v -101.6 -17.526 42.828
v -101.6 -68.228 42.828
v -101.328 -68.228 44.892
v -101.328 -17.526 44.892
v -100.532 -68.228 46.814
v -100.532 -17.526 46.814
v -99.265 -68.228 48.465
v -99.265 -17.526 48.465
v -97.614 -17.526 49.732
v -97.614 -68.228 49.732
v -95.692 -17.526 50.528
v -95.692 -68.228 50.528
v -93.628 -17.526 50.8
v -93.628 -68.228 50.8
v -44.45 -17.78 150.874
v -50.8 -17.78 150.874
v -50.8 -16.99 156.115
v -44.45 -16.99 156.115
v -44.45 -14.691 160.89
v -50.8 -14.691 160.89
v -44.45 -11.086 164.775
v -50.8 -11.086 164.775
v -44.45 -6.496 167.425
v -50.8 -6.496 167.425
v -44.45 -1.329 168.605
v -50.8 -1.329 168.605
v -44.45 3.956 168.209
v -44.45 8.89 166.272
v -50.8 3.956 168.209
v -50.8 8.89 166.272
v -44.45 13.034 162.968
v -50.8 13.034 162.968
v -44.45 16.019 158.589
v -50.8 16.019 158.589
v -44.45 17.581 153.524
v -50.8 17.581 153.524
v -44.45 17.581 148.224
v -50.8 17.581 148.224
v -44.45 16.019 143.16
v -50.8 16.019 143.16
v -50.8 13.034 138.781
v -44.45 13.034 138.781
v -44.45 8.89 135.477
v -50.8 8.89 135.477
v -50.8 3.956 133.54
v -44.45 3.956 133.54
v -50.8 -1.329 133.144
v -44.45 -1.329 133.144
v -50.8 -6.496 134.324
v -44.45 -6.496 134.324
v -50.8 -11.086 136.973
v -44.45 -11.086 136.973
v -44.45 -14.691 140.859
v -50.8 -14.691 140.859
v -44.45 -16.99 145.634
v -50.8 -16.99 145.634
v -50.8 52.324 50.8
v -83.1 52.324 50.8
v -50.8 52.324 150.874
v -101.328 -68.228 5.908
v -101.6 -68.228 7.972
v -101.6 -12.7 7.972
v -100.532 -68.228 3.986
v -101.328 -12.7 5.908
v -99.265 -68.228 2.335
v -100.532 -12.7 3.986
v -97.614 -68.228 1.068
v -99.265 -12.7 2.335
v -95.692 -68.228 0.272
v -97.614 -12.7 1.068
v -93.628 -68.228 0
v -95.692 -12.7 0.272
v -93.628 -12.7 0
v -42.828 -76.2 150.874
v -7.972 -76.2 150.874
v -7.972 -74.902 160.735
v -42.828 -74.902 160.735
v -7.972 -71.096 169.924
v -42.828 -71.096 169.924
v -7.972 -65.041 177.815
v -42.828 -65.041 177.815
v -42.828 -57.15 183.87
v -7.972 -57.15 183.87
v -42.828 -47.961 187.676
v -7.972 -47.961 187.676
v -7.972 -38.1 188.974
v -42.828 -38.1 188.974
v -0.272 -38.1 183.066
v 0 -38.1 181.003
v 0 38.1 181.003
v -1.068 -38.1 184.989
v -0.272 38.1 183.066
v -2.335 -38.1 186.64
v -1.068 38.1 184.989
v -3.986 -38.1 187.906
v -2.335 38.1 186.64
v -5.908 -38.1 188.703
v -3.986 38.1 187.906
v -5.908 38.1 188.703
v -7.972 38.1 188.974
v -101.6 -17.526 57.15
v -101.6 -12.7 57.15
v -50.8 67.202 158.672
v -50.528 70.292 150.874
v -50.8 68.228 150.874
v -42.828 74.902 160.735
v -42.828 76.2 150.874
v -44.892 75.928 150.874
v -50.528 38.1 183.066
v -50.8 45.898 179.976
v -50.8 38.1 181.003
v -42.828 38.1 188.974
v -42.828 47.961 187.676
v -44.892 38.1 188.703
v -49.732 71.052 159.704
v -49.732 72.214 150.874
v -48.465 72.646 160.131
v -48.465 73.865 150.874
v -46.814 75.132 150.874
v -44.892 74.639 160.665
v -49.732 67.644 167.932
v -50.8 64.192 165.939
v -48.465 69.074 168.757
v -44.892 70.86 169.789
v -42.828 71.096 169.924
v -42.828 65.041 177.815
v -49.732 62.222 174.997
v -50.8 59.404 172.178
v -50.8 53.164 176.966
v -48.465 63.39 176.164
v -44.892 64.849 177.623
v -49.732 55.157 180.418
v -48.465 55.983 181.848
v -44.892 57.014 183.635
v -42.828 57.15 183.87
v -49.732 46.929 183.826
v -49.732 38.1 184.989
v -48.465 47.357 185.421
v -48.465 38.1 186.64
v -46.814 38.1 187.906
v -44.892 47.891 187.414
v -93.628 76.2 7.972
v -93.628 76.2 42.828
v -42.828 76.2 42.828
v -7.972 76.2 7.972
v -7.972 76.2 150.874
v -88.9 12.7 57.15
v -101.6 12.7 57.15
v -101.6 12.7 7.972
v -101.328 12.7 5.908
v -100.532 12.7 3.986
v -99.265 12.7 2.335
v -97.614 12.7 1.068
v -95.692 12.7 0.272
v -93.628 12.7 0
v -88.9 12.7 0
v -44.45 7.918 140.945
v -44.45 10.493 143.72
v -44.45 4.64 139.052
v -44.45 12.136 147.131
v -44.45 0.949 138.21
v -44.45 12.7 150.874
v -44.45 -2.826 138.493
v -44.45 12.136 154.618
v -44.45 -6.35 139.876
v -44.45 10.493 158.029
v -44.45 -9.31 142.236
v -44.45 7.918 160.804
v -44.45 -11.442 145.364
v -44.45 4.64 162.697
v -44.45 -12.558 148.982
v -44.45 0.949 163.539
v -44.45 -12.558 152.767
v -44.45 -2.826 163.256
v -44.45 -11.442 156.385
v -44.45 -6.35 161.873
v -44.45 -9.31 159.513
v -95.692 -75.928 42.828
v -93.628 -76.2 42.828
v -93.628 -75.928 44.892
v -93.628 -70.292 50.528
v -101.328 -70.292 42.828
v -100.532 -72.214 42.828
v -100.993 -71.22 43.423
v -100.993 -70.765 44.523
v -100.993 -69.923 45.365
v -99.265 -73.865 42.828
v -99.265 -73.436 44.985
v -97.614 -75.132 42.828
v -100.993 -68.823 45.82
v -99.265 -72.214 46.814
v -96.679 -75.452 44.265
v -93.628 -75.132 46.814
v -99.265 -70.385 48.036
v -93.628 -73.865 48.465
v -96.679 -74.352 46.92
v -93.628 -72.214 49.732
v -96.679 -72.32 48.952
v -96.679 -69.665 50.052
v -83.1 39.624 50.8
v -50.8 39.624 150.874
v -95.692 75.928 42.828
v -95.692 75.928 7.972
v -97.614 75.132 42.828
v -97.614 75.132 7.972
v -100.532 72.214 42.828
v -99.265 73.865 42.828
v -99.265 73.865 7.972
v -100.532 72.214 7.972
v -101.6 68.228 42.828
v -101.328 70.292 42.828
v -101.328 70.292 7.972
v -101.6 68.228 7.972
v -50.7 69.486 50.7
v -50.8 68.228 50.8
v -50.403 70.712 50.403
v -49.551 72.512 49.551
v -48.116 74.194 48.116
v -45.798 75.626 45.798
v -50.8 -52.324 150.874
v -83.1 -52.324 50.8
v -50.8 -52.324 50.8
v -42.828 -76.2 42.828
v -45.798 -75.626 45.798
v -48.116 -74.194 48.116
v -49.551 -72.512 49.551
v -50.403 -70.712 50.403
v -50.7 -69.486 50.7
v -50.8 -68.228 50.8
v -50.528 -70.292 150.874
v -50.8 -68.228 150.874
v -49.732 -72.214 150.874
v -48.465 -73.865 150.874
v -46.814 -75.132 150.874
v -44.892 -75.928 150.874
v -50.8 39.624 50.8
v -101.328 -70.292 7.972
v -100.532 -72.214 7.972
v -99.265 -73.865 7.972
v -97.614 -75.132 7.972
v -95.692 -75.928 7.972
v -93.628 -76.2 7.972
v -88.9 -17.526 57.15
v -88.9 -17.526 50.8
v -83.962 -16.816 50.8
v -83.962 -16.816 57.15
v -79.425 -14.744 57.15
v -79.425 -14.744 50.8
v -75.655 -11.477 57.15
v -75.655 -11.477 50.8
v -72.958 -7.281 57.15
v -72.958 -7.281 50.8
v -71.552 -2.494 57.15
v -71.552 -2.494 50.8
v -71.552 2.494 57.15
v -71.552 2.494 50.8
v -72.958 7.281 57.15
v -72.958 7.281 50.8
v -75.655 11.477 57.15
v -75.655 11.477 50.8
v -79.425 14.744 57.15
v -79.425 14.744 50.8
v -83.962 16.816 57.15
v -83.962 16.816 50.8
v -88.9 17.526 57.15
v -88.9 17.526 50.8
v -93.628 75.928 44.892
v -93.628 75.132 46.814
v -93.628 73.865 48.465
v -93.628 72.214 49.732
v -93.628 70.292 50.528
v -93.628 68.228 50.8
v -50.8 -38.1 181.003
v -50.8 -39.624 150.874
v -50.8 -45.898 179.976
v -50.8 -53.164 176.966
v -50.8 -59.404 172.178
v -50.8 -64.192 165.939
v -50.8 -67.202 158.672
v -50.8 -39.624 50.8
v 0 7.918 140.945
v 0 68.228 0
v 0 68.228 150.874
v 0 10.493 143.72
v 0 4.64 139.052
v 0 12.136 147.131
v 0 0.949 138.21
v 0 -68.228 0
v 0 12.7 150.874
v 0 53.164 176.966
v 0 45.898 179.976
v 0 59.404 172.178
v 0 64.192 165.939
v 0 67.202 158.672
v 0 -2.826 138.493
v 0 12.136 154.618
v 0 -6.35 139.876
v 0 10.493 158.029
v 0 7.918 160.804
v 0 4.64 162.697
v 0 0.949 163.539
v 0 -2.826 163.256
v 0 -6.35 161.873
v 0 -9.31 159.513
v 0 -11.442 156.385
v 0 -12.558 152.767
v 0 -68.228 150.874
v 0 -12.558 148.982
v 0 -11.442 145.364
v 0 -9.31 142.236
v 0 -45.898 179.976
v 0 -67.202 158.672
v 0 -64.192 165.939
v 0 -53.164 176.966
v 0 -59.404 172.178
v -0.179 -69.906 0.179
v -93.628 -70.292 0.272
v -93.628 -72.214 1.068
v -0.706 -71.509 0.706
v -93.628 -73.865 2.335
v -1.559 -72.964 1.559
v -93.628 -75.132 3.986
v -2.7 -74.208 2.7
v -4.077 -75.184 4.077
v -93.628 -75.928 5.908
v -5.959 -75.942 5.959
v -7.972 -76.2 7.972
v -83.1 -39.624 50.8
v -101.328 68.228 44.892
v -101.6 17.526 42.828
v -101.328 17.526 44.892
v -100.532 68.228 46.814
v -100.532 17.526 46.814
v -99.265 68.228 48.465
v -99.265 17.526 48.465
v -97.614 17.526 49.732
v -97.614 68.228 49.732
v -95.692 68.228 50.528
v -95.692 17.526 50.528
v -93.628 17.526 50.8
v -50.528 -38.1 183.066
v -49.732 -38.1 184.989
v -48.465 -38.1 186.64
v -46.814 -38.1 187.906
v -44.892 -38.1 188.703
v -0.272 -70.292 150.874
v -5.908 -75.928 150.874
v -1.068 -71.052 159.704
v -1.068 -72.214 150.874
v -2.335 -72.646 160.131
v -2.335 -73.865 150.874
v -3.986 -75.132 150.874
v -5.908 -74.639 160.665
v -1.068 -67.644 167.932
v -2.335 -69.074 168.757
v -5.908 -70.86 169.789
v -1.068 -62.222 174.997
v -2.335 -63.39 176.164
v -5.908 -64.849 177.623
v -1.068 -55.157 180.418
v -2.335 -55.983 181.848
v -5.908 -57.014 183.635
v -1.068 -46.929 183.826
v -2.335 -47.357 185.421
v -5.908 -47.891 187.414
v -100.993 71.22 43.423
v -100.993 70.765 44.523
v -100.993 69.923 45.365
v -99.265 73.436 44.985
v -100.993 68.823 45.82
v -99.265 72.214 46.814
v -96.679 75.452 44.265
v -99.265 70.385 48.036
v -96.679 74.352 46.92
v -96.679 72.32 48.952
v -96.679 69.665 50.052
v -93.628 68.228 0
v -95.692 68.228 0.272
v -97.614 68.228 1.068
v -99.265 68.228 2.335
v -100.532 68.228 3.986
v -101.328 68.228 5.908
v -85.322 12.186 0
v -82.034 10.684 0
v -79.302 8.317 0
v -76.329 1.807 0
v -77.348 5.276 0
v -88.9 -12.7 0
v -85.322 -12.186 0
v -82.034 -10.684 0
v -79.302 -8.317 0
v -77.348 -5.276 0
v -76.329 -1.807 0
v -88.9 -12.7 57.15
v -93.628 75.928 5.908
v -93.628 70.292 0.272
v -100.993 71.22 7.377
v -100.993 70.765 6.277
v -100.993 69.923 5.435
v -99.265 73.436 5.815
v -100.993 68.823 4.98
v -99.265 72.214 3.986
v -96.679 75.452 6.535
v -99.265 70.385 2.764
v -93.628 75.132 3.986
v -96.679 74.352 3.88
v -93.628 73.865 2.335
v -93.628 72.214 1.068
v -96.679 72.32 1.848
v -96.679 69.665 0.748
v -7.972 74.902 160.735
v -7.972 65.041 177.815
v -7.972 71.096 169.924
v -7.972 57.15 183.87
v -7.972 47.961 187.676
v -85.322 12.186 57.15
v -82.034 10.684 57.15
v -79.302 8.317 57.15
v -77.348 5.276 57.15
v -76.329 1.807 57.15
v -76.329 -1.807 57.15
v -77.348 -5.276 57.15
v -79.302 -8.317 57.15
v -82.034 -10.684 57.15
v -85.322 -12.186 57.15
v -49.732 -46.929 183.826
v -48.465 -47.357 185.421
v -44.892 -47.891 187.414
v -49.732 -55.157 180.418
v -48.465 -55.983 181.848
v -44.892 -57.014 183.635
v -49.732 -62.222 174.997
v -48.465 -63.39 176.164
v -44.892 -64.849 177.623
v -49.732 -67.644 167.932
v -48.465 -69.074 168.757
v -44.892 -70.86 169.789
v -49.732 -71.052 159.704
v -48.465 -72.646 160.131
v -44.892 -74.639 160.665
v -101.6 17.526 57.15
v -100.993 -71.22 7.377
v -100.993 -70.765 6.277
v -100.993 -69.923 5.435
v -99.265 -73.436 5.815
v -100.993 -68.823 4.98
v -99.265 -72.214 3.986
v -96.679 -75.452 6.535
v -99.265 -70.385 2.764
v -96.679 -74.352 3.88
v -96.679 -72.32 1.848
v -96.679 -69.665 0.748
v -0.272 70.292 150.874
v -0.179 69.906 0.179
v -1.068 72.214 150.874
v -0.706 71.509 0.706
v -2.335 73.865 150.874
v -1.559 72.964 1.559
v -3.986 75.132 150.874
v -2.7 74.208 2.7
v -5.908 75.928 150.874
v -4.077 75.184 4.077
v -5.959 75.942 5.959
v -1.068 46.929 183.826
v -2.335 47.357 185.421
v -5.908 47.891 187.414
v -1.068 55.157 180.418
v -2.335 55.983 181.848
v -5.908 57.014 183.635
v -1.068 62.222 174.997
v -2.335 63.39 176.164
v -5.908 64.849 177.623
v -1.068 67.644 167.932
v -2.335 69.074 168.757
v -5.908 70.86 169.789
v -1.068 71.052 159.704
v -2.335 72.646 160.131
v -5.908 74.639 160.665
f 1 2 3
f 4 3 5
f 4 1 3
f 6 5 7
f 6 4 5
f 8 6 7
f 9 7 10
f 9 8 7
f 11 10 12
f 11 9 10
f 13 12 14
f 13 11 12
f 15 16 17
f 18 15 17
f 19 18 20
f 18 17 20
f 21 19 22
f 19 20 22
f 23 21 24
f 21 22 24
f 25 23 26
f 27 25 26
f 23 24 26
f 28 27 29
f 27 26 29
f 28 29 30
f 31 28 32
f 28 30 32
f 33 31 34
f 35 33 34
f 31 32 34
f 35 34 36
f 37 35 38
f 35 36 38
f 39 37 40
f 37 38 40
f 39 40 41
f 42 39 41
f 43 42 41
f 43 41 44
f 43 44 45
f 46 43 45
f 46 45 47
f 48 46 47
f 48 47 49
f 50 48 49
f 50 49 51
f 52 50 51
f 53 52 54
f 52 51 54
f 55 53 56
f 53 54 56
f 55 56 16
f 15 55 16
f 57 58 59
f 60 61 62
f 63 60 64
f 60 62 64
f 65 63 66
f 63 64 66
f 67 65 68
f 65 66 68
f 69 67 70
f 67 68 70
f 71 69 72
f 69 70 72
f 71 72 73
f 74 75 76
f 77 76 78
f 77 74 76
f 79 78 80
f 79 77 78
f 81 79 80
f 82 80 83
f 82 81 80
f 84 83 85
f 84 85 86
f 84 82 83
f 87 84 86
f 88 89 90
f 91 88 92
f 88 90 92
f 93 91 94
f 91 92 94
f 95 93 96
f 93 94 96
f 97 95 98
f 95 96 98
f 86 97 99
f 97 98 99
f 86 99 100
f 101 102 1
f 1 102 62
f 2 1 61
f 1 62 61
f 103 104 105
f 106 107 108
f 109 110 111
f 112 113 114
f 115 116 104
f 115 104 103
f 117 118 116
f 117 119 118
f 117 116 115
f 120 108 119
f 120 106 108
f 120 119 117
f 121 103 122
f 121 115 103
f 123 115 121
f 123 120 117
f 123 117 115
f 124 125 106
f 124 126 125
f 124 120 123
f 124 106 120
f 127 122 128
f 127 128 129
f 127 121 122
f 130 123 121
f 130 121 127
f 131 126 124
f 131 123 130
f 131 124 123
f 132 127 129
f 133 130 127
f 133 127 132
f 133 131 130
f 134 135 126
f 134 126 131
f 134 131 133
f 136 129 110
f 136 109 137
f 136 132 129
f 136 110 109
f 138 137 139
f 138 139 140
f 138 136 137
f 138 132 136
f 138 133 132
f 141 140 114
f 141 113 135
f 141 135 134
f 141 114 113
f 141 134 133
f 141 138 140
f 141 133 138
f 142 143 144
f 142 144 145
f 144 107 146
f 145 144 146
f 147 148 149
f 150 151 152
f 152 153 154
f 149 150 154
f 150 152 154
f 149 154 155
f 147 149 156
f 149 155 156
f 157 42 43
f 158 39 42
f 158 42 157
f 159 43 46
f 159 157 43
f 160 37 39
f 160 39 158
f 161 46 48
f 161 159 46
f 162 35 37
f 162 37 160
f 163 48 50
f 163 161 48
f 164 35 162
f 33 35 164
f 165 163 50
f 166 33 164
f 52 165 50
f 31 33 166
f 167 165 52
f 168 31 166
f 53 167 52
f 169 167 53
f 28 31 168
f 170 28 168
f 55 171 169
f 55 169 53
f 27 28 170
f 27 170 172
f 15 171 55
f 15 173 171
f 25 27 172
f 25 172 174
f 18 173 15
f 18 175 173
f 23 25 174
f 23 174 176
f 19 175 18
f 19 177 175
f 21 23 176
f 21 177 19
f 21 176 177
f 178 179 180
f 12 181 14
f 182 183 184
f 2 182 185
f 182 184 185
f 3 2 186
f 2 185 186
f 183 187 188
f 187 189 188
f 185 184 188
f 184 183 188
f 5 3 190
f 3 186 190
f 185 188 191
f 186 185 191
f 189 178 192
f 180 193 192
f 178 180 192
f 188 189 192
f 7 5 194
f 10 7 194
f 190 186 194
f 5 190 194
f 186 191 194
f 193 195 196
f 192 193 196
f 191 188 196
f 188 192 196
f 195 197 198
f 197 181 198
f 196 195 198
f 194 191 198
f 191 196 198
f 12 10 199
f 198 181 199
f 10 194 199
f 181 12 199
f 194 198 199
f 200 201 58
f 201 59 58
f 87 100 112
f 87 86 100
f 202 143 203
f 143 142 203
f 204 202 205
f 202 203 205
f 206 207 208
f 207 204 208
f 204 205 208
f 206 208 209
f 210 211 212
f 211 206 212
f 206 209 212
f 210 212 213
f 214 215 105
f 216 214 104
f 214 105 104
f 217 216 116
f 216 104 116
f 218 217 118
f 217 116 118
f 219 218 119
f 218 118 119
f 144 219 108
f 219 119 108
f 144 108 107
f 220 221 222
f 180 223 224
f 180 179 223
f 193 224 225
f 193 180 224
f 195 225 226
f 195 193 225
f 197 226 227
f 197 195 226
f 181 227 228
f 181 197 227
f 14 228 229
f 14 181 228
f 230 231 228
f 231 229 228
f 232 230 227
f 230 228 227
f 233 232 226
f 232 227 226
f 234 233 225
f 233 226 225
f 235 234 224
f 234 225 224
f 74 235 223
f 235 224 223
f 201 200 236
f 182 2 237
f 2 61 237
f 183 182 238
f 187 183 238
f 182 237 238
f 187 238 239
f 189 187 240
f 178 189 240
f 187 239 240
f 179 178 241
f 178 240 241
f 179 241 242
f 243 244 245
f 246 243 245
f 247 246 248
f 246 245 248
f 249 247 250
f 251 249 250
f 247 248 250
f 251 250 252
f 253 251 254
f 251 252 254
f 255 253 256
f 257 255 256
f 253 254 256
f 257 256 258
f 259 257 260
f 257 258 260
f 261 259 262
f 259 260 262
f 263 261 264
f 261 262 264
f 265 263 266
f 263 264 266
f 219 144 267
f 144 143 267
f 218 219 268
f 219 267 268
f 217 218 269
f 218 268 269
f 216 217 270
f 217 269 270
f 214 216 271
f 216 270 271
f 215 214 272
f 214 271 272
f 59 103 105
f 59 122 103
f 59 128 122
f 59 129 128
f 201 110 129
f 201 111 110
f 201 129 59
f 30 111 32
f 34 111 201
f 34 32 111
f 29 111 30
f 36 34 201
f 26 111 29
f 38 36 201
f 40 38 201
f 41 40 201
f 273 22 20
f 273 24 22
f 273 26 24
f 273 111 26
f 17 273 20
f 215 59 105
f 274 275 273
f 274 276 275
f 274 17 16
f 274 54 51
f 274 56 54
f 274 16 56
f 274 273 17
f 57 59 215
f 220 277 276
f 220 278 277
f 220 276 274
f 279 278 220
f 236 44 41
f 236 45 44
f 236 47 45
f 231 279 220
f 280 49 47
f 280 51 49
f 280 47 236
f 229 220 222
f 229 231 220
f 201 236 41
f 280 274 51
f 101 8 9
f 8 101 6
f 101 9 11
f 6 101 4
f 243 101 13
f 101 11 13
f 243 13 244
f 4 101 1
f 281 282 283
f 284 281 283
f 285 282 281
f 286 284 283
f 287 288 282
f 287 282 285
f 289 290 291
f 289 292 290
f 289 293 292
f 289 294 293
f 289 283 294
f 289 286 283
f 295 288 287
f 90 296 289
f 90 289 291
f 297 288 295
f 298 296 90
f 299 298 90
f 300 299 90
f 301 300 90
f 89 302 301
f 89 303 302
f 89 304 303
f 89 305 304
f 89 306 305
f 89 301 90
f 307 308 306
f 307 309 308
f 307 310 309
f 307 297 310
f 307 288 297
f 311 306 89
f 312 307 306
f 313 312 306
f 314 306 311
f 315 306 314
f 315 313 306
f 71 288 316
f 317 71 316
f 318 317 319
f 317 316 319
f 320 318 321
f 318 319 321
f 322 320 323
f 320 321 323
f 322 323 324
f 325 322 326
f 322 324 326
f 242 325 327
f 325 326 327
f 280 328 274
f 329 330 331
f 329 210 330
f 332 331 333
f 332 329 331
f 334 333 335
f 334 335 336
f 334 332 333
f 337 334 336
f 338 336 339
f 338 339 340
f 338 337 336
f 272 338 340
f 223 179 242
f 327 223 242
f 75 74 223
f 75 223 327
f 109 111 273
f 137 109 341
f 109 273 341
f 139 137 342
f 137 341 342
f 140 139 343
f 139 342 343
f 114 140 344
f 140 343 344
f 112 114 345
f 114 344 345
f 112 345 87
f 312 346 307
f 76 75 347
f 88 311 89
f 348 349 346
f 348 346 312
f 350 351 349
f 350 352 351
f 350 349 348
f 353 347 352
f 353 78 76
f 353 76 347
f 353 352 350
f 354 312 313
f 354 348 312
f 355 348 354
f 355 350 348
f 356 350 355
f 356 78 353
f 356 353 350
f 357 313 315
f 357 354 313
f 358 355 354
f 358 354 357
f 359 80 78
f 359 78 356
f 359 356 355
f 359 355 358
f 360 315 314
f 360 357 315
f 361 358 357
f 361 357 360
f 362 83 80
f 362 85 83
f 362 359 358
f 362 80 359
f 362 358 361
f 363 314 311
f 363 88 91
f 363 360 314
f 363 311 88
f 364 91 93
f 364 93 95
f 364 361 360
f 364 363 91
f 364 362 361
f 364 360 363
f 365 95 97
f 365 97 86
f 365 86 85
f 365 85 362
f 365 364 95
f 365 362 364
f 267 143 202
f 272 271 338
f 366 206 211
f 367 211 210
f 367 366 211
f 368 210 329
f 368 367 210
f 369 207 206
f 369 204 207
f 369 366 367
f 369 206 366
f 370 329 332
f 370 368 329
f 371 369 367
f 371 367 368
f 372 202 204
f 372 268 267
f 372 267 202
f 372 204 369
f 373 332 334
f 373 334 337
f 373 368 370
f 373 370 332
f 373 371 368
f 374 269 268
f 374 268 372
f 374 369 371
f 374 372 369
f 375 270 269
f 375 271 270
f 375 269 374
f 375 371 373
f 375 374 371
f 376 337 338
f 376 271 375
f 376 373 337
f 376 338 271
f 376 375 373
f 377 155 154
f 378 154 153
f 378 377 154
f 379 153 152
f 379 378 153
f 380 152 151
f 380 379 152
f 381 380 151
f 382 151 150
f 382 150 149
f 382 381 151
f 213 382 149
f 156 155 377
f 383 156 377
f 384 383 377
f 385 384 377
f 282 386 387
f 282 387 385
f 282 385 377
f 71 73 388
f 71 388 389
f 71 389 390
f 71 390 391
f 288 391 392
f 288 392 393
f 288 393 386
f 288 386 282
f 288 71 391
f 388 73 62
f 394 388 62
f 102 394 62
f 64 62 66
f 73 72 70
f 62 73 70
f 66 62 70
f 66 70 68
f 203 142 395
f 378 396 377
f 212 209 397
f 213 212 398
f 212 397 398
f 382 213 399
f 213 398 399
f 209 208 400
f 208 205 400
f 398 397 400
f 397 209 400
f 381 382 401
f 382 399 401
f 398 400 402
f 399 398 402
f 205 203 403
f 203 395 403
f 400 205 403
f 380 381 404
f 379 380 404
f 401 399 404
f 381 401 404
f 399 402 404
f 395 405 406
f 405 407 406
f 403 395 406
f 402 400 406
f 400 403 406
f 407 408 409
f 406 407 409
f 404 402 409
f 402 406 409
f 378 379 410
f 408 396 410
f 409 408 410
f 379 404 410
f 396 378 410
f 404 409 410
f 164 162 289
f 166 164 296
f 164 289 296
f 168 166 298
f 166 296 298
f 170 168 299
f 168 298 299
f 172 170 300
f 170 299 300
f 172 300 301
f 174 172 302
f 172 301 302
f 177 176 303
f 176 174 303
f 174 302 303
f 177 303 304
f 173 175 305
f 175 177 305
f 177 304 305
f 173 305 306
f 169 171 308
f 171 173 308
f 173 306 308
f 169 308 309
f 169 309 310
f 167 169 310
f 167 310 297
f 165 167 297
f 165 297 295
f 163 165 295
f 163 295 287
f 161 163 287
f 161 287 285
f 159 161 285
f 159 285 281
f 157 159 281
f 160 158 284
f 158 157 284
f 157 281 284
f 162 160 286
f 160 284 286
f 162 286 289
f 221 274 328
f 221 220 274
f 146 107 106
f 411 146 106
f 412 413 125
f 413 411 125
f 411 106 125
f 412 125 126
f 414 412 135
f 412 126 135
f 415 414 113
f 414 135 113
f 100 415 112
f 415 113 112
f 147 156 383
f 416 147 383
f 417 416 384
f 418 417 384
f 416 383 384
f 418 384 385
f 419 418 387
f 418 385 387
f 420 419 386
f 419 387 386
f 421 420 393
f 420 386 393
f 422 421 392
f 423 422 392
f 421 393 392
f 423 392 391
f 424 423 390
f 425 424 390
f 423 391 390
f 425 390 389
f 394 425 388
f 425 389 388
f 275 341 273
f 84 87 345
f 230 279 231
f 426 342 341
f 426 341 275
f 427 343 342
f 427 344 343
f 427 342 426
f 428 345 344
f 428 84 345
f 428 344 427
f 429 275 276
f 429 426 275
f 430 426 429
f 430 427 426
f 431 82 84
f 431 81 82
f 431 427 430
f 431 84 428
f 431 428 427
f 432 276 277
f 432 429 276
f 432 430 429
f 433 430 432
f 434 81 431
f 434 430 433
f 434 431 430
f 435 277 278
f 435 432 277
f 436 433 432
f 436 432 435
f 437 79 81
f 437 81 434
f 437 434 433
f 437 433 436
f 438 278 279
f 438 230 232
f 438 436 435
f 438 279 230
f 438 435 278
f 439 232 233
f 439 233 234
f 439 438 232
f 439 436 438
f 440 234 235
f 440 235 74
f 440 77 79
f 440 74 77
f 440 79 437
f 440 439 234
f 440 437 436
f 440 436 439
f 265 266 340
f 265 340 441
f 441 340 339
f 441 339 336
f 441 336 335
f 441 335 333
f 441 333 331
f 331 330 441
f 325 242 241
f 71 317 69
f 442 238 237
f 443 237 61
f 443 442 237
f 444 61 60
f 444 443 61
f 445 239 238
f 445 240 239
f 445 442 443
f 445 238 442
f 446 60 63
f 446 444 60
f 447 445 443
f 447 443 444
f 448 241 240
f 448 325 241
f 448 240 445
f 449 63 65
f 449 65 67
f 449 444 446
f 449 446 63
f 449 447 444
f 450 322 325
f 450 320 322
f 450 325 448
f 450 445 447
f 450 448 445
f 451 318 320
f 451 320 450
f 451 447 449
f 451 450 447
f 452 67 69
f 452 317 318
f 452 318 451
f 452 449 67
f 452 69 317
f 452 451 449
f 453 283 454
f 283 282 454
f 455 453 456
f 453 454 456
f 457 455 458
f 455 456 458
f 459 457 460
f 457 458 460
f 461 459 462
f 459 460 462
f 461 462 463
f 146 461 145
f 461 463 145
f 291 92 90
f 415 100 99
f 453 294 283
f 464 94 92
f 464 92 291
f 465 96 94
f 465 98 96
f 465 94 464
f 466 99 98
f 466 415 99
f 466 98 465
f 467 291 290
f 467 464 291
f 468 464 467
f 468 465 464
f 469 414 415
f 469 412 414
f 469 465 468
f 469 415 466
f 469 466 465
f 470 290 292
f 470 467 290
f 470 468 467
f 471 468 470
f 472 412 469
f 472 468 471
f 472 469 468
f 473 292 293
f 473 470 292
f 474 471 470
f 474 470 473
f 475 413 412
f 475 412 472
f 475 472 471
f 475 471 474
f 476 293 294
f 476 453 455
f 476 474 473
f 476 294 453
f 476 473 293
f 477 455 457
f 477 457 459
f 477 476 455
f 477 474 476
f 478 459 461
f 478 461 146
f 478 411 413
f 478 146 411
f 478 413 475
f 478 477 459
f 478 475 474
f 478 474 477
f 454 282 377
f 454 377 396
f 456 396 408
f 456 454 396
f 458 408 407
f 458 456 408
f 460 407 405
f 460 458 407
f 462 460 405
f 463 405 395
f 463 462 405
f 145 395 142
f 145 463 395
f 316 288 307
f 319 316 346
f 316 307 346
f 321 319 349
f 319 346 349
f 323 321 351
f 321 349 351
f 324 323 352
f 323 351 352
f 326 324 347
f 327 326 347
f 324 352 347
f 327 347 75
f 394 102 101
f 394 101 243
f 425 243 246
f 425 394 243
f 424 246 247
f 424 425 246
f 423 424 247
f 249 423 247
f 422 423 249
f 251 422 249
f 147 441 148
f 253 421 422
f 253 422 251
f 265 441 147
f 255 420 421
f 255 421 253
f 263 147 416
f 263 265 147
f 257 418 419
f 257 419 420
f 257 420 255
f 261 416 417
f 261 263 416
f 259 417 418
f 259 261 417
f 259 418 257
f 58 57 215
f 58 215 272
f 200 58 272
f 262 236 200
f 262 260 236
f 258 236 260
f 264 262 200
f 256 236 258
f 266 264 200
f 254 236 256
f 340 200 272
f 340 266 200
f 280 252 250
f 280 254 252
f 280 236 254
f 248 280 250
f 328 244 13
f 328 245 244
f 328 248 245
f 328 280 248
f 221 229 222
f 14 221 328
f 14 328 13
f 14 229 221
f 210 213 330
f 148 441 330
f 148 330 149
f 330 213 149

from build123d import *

# Parameters (mm, degrees)
F1_DEPTH  = 76.2
F2_R      = 12.7
F3_DEPTH  = 101.601
F5_DEPTH  = 50.801
F6_R      = 38.1
F7_R      = 17.78
F7_R_2    = 12.7
F8_DEPTH  = 6.35
F12_DEPTH = 6.35
F15_DEPTH = 6.35
F16_R     = 7.971733183


# Not quite as in the source:
# - a pattern or mirror of a feature is missing from the dataset's text; its kind, count and spacing are read off the source's solid


with BuildPart() as f1:
    # F0 (on Front) → F1 (new body, symmetric)
    with BuildSketch(Plane.XZ):
        Polygon((-101.6, 0), (0, 0), (0, 188.9744497656), (-50.8, 188.9744497656), (-50.8, 50.8), (-101.6, 50.8), align=None)
    extrude(amount=F1_DEPTH, both=True)

    # F2 (on face) → F3 (cut, through all)
    with BuildSketch(Plane.YZ):
        with Locations((0, 150.8744497656)):
            Circle(F2_R)
    extrude(amount=-F3_DEPTH, mode=Mode.SUBTRACT)

    # F4 (on face) → F5 (cut, through all)
    with BuildSketch(Plane.XY.offset(50.8)):
        with BuildLine():
            Line((-88.9, 12.7), (-101.6, 12.7))
            Line((-101.6, 12.7), (-101.6, -12.7))
            Line((-101.6, -12.7), (-88.9, -12.7))
            ThreePointArc((-88.9, -12.7), (-76.2, 0), (-88.9, 12.7))
        make_face()
    extrude(amount=-F5_DEPTH, mode=Mode.SUBTRACT)

    # F6
    f6_edges = [f1.edges().sort_by_distance(p)[0] for p in [
        (-25.4, -76.2, 188.97445),
        (-25.4, 76.2, 188.97445),
    ]]
    fillet(f6_edges, radius=F6_R)

    # F7 (on face) → F8 (cut)
    with BuildSketch(Plane(origin=(-50.8, 0, 0), x_dir=(0, -1, 0), z_dir=(-1, 0, 0))):
        with Locations((0, 150.8744497656)):
            Circle(F7_R)
        with Locations((0, 150.8744497656)):
            Circle(F7_R_2, mode=Mode.SUBTRACT)
    extrude(amount=-F8_DEPTH, mode=Mode.SUBTRACT)

    # F11 (on offset) → F12 (join, symmetric)
    with BuildSketch(Plane.XZ.offset(45.974)):
        Polygon((-83.1002444029, 50.8), (-50.8, 50.8), (-50.8, 150.8744497656), align=None)
    f12 = extrude(amount=F12_DEPTH, both=True)

    # F12_copies: F12 across plane
    add(f12.mirror(Plane.ZX))

    # F14 (on face) → F15 (join)
    with BuildSketch(Plane.XY.offset(50.8)):
        with BuildLine():
            Line((-101.6, -12.7), (-101.6, -17.5260007381))
            Line((-101.6, -17.5260007381), (-88.9, -17.5260007381))
            ThreePointArc((-88.9, -17.5260007381), (-71.3739992619, 0), (-88.9, 17.5260007381))
            Line((-88.9, 17.5260007381), (-101.6, 17.5260007381))
            Line((-101.6, 17.5260007381), (-101.6, 12.7))
            Line((-101.6, 12.7), (-88.9, 12.7))
            ThreePointArc((-88.9, 12.7), (-76.2, 0), (-88.9, -12.7))
            Line((-88.9, -12.7), (-101.6, -12.7))
        make_face()
    extrude(amount=F15_DEPTH)

    # F16
    f16_edges = [f1.edges().sort_by_distance(p)[0] for p in [
        (-76.2, -76.2, 50.8),
        (-76.2, 76.2, 50.8),
        (-50.8, -76.2, 0),
        (0, -76.2, 75.437225),
        (-25.4, -76.2, 150.87445),
        (-50.8, -76.2, 100.837225),
        (-101.6, -76.2, 25.4),
        (-50.8, 76.2, 0),
        (-101.6, 76.2, 25.4),
        (-101.6, 46.863, 50.8),
        (-101.6, -46.863, 50.8),
        (-101.6, -44.45, 0),
        (-101.6, 44.45, 0),
        (0, 76.2, 75.437225),
        (-50.8, 76.2, 100.837225),
        (0, 65.040768, 177.815218),
        (-50.8, 65.040768, 177.815218),
        (0, 0, 188.97445),
        (-50.8, 0, 188.97445),
        (-50.8, -65.040768, 177.815218),
        (0, -65.040768, 177.815218),
    ]]
    fillet(f16_edges, radius=F16_R)


solid = f1.part
